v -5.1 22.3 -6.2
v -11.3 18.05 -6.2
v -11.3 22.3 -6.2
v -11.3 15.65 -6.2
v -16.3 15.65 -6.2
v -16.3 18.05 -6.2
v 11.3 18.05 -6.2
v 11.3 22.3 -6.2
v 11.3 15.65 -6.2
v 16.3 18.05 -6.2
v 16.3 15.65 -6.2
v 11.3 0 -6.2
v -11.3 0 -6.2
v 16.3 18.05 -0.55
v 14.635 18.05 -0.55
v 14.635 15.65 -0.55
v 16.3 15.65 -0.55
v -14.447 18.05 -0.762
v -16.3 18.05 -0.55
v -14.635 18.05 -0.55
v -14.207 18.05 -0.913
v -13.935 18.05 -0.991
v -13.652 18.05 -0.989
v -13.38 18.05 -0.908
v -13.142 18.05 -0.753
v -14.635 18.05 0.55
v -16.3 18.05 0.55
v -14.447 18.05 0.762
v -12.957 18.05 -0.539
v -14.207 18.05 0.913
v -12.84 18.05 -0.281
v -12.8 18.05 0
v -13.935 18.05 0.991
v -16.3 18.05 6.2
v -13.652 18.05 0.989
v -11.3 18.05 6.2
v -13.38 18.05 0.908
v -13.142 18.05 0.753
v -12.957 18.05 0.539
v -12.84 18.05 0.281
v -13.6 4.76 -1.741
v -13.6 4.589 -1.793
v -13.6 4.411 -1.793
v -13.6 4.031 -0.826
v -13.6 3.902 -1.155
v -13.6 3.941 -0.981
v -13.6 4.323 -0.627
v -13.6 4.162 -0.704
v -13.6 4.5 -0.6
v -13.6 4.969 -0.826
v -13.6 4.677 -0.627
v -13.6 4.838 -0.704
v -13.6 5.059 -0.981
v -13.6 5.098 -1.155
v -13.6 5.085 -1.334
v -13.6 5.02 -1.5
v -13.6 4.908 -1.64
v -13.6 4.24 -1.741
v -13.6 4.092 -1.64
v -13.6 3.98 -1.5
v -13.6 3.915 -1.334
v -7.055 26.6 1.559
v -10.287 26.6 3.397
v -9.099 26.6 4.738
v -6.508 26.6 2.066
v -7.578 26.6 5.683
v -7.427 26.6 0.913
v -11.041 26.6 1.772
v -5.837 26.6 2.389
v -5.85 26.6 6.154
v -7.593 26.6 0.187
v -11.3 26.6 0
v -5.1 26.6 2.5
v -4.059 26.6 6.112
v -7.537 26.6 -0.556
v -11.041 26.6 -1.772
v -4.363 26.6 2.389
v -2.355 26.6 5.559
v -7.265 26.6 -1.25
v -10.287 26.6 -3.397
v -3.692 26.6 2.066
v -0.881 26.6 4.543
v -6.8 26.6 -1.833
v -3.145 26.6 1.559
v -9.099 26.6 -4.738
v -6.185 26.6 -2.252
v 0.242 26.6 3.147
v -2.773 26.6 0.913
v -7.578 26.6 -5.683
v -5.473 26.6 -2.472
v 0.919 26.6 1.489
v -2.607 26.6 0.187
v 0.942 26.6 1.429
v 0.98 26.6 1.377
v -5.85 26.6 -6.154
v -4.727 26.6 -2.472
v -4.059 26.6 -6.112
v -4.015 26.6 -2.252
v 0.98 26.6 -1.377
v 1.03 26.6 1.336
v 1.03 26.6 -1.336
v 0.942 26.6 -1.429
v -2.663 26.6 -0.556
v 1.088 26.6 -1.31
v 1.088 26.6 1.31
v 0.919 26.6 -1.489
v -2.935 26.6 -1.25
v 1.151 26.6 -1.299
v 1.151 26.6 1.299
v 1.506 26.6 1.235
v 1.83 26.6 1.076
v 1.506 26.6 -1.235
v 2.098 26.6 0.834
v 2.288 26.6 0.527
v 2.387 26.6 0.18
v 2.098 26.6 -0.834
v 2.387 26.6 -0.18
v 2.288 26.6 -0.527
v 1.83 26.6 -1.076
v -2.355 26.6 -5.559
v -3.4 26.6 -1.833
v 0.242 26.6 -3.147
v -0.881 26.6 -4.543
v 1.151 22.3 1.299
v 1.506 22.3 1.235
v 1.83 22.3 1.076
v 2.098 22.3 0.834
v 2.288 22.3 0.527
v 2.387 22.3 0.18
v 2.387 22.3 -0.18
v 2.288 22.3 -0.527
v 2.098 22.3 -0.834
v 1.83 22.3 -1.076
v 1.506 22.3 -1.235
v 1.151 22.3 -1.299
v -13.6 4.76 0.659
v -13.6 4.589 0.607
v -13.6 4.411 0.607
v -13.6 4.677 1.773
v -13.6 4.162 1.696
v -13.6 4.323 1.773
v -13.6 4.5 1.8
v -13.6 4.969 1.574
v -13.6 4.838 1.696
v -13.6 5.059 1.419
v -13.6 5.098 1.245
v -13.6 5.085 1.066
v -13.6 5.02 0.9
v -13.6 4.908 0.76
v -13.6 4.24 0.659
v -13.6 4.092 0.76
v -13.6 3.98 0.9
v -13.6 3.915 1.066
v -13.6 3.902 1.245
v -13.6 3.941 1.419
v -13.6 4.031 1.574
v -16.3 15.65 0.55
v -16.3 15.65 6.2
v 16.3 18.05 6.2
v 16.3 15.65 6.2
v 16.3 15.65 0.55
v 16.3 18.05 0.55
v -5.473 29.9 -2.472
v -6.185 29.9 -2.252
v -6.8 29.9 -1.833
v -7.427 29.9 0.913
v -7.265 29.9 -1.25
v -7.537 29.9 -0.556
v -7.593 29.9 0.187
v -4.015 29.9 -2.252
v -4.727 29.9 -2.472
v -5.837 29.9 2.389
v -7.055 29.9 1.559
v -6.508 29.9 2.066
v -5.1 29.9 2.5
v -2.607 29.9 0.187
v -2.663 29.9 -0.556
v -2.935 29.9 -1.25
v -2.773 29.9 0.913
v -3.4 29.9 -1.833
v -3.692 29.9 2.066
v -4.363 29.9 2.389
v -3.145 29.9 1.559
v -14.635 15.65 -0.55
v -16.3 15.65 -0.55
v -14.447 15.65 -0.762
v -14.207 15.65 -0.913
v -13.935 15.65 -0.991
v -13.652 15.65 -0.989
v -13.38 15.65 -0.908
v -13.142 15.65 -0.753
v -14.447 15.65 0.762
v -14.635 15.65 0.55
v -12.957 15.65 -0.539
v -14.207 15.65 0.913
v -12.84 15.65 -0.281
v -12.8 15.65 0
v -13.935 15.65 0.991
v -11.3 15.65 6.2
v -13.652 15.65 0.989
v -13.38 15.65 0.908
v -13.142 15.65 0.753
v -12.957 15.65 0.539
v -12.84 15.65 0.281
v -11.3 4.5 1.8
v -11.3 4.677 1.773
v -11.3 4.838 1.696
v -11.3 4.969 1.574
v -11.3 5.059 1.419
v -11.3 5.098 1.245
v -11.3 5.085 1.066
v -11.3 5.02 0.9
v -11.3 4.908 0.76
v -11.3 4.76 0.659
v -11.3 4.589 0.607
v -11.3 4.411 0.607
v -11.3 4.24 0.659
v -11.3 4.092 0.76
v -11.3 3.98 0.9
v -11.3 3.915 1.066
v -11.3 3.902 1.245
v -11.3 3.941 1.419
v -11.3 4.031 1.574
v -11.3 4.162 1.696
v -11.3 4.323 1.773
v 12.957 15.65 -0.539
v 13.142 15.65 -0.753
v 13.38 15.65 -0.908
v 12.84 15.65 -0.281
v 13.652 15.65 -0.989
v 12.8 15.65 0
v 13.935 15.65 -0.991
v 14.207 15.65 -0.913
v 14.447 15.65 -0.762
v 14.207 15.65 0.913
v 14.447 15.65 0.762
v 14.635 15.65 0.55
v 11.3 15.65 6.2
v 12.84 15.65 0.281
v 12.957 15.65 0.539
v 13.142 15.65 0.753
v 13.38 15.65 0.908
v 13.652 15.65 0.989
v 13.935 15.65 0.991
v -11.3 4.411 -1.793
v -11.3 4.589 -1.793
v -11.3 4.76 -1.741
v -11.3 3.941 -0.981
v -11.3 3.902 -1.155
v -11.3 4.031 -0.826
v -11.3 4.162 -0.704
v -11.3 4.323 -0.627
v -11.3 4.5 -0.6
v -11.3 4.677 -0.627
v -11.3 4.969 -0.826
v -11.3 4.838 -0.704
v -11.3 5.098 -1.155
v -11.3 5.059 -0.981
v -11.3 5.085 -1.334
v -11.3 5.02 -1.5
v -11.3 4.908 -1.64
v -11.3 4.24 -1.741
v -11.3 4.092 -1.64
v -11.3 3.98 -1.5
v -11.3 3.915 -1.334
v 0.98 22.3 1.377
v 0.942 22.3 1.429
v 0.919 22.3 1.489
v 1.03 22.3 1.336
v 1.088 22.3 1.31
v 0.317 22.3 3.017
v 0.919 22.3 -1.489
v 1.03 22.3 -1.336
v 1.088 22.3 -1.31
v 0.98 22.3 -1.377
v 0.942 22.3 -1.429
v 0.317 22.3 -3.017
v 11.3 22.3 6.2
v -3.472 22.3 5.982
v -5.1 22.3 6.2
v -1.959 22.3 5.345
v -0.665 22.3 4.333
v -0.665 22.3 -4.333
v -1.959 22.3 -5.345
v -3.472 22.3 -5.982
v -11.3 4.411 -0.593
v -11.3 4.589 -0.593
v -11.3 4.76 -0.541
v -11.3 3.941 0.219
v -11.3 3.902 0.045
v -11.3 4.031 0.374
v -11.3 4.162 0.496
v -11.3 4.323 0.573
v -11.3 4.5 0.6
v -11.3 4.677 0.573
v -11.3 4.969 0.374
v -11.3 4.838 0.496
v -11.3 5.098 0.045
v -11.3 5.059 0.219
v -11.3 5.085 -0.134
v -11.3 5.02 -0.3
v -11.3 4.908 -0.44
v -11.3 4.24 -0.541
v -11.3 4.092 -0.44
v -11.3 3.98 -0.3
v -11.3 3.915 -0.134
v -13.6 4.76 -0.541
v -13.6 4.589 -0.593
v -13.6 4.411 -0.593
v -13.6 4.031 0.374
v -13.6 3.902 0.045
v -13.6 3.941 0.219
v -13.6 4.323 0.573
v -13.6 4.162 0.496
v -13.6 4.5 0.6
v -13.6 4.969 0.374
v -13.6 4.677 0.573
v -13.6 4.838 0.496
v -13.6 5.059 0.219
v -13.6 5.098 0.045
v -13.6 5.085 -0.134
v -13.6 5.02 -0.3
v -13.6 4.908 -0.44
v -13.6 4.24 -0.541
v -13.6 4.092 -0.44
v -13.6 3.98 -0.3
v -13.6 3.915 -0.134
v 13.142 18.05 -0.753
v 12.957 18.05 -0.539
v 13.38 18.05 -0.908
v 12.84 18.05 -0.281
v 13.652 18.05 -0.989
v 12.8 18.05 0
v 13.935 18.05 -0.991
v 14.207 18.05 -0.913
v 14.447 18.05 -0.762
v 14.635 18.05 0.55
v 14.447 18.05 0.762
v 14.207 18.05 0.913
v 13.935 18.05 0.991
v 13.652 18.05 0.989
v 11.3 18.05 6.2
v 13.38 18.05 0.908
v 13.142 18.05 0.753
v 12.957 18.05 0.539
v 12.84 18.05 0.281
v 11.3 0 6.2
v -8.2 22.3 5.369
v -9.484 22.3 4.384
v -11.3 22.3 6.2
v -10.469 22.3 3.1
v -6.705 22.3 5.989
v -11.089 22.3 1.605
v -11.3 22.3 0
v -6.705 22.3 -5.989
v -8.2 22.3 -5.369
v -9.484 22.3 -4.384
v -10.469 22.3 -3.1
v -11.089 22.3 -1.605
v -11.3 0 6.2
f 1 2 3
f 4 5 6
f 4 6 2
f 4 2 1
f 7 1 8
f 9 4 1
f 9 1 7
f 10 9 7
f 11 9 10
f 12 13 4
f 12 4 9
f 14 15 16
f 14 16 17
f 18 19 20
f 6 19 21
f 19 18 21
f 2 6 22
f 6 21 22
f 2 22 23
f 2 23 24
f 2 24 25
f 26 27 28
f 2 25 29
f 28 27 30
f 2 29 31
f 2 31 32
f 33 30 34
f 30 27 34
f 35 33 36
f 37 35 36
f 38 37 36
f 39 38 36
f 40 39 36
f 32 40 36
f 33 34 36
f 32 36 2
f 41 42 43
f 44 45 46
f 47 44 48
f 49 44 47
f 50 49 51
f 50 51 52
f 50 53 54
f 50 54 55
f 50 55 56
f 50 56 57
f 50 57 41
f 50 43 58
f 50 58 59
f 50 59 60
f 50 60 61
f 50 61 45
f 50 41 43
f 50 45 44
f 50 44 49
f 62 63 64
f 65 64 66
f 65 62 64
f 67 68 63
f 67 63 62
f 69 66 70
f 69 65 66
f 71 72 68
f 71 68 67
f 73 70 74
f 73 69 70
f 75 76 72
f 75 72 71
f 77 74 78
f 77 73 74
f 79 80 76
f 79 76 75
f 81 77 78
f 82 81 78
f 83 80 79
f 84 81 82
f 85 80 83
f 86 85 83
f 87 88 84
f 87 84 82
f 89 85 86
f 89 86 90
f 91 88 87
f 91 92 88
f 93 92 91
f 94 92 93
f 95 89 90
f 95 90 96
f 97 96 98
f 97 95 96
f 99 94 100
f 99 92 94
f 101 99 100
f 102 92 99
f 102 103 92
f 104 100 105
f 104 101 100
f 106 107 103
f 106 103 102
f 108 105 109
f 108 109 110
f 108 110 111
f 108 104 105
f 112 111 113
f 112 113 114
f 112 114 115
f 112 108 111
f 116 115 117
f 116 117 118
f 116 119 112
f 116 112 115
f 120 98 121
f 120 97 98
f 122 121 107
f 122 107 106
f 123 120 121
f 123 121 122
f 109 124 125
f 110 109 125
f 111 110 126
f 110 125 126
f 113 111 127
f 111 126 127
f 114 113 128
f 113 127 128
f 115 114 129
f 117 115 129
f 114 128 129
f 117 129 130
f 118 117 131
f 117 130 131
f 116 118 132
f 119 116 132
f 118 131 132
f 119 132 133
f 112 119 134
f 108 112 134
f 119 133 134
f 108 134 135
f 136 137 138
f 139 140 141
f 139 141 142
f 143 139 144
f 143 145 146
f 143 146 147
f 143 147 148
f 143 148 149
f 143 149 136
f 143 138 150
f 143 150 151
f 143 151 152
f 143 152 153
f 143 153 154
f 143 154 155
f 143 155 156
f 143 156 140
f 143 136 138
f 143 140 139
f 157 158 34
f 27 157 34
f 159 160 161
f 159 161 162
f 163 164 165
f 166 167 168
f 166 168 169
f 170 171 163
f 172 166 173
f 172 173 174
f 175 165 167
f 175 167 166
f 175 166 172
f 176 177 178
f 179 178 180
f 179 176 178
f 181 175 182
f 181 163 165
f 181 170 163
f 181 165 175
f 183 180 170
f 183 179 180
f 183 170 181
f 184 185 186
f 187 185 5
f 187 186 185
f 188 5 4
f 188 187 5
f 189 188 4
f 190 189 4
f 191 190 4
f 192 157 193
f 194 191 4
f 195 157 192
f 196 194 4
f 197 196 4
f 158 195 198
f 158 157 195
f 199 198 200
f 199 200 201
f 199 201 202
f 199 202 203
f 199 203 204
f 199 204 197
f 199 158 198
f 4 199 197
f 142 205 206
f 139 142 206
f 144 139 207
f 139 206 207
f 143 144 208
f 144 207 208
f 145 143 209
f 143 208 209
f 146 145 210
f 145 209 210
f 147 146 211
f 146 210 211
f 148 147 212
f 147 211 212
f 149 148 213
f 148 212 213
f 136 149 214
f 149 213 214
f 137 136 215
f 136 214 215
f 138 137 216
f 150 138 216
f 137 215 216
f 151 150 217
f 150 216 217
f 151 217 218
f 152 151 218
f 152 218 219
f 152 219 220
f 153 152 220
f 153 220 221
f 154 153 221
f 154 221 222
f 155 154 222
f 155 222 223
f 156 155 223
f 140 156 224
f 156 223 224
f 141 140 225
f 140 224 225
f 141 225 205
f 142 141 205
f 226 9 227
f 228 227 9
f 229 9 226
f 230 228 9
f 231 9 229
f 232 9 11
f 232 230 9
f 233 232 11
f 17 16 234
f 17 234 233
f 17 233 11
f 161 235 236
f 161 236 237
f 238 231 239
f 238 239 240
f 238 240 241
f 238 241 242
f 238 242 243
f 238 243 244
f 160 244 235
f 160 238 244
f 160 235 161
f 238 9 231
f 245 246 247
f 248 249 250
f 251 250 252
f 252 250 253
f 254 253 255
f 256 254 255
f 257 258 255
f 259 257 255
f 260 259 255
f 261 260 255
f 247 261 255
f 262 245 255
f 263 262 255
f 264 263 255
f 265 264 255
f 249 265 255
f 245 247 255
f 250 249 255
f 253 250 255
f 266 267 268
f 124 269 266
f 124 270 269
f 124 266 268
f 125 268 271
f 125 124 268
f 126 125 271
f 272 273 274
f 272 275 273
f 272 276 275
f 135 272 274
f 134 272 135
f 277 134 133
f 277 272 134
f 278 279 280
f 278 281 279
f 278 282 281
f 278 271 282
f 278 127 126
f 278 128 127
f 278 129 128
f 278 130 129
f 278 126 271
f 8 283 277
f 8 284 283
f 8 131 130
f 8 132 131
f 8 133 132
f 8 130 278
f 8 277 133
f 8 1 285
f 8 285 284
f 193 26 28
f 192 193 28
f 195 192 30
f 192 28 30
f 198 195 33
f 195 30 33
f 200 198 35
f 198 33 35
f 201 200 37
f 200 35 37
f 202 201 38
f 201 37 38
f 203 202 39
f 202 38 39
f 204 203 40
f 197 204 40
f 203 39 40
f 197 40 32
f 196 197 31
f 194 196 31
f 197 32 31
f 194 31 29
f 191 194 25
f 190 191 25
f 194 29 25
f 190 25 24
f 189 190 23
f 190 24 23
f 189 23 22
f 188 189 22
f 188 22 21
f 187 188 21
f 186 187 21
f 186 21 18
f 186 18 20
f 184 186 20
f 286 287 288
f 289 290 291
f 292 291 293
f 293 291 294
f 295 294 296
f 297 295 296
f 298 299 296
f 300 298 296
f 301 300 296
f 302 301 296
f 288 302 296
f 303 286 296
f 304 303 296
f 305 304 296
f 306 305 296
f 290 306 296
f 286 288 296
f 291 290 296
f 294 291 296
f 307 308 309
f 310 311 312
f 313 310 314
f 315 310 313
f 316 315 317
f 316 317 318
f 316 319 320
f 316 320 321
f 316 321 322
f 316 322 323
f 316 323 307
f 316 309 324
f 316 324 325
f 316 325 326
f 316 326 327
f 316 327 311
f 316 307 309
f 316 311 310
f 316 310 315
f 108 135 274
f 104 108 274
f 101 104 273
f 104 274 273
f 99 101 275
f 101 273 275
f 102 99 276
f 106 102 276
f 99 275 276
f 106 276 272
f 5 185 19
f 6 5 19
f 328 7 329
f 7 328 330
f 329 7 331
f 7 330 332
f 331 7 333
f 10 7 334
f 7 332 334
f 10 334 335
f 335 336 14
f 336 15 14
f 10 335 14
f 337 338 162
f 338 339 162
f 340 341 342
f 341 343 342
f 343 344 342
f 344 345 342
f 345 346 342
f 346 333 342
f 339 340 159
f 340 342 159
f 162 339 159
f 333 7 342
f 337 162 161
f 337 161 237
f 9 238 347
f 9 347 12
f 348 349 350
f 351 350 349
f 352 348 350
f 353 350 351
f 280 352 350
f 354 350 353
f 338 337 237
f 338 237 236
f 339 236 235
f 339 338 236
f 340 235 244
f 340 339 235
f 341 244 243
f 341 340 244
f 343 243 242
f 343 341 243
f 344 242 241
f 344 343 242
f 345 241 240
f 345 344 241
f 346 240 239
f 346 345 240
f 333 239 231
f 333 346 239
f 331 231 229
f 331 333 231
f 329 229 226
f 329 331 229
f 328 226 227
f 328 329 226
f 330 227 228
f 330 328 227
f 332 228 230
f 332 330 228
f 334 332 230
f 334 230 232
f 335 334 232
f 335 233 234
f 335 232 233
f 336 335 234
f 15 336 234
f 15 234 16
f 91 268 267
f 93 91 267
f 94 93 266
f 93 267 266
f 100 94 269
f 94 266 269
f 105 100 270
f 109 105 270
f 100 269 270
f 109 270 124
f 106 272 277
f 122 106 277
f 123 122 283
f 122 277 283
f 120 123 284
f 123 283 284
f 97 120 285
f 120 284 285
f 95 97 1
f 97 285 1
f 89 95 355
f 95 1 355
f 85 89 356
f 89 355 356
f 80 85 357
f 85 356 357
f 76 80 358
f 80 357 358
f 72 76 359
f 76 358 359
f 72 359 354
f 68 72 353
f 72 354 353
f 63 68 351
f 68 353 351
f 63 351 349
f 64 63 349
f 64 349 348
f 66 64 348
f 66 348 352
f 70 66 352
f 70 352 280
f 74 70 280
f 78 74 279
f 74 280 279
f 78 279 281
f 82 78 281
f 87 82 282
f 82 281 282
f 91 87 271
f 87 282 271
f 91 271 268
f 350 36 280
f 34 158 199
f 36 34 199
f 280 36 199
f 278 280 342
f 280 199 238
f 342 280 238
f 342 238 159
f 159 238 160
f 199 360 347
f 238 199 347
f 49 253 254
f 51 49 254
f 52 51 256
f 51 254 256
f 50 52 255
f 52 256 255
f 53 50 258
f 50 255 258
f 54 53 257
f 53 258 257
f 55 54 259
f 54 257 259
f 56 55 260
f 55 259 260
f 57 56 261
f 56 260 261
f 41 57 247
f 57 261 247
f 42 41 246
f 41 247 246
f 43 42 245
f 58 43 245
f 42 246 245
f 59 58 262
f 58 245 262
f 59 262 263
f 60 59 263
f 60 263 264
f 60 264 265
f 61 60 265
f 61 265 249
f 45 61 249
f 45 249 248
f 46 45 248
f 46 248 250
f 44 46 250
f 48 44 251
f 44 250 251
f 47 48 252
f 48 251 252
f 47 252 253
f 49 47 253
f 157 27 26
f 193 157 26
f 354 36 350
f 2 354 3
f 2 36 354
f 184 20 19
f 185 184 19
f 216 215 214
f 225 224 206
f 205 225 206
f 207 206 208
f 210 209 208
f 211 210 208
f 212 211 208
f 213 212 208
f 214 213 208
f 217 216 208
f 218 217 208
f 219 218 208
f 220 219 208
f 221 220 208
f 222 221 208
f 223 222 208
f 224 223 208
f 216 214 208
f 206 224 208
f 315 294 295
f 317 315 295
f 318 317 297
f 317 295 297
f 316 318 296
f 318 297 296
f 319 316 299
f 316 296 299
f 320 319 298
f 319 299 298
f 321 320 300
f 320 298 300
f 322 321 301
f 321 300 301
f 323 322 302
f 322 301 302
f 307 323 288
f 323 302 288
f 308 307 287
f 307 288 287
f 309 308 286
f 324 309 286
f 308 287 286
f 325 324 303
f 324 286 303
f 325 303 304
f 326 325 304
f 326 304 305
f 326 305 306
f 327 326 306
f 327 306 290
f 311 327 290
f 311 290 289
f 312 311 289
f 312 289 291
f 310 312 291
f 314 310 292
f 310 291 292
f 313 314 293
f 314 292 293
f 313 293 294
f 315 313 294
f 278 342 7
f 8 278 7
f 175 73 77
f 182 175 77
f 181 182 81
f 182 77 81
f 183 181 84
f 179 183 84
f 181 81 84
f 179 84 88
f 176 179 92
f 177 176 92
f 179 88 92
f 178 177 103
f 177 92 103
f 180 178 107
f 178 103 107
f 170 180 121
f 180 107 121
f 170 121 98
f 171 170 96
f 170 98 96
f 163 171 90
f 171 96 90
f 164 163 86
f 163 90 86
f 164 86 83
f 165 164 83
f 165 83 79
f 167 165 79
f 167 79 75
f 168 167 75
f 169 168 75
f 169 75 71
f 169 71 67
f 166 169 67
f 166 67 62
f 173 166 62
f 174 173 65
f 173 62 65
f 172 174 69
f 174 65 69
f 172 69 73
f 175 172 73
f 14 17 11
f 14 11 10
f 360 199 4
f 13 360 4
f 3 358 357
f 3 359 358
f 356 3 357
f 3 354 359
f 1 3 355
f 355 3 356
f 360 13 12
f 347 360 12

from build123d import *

# Parameters (mm, degrees)
SKETCH1_W             = 22.6
SKETCH1_H             = 12.4
BOSS_EXTRUDE1_DEPTH   = 22.3
SKETCH2_W             = 5
SKETCH2_H             = 2.4
BOSS_EXTRUDE2_DEPTH   = 12.4
CUT_EXTRUDE1_DEPTH    = 26.098456128
BOSS_EXTRUDE3_DEPTH   = 4.3
SKETCH5_R             = 2.5
BOSS_EXTRUDE4_DEPTH   = 3.3
SKETCH6_R             = 0.6
BOSS_EXTRUDE7_DEPTH   = 2.3
BOSS_EXTRUDE7_2_DEPTH = 2.3
BOSS_EXTRUDE7_3_DEPTH = 2.3


with BuildPart() as part:
    # Sketch1 → Boss-Extrude1 (new body)
    with BuildSketch(Plane(origin=(0, 0, 0), x_dir=(1, 0, 0), z_dir=(0, 1, 0))):
        Rectangle(SKETCH1_W, SKETCH1_H)
    extrude(amount=BOSS_EXTRUDE1_DEPTH)

    # Sketch2 → Boss-Extrude2 (add)
    with BuildSketch(Plane.XY.offset(6.2)):
        with Locations((13.8, 16.85)):
            Rectangle(SKETCH2_W, SKETCH2_H)
        with Locations((-13.8, 16.85)):
            Rectangle(SKETCH2_W, SKETCH2_H)
    extrude(amount=-BOSS_EXTRUDE2_DEPTH)

    # Sketch3 → Cut-Extrude1 (cut, through all)
    with BuildSketch(Plane(origin=(0, 18.05, 0), x_dir=(1, 0, 0), z_dir=(0, 1, 0))):
        with BuildLine():
            Line((14.635164654, 0.55), (16.3, 0.55))
            Line((16.3, 0.55), (16.3, -0.55))
            Line((16.3, -0.55), (14.635164654, -0.55))
            ThreePointArc((14.635164654, -0.55), (12.8, 0), (14.635164654, 0.55))
        make_face()
        with BuildLine():
            Line((-16.3, -0.55), (-14.635164654, -0.55))
            ThreePointArc((-14.635164654, -0.55), (-12.8, 0), (-14.635164654, 0.55))
            Line((-14.635164654, 0.55), (-16.3, 0.55))
            Line((-16.3, 0.55), (-16.3, -0.55))
        make_face()
    extrude(amount=-CUT_EXTRUDE1_DEPTH, mode=Mode.SUBTRACT)

    # Sketch4 → Boss-Extrude3 (add)
    with BuildSketch(Plane(origin=(0, 22.3, 0), x_dir=(1, 0, 0), z_dir=(0, 1, 0))):
        with BuildLine():
            ThreePointArc((0.918604651, 1.488757218), (-11.3, 0), (0.918604651, -1.488757218))
            ThreePointArc((0.918604651, -1.488757218), (1.003329596, -1.355013632), (1.151404787, -1.298983275))
            ThreePointArc((1.151404787, -1.298983275), (2.4, 0), (1.151404787, 1.298983275))
            ThreePointArc((1.151404787, 1.298983275), (1.003329596, 1.355013632), (0.918604651, 1.488757218))
        make_face()
    extrude(amount=BOSS_EXTRUDE3_DEPTH)

    # Sketch5 → Boss-Extrude4 (add)
    with BuildSketch(Plane(origin=(0, 26.6, 0), x_dir=(1, 0, 0), z_dir=(0, 1, 0))):
        with Locations(Location((-5.1, 0, 0), (0, 0, 270))):
            Circle(SKETCH5_R)
    extrude(amount=BOSS_EXTRUDE4_DEPTH)


with BuildPart() as body_2:
    # Sketch6 → Boss-Extrude7 (new body)
    with BuildSketch(Plane.ZY.offset(11.3)):
        with Locations((0, 4.5)):
            Circle(SKETCH6_R)
    extrude(amount=BOSS_EXTRUDE7_DEPTH)


with BuildPart() as body_3:
    # Sketch6 → Boss-Extrude7 2 (new body)
    with BuildSketch(Plane.ZY.offset(11.3)):
        with Locations((1.2, 4.5)):
            Circle(SKETCH6_R)
    extrude(amount=BOSS_EXTRUDE7_2_DEPTH)


with BuildPart() as body_4:
    # Sketch6 → Boss-Extrude7 3 (new body)
    with BuildSketch(Plane.ZY.offset(11.3)):
        with Locations((-1.2, 4.5)):
            Circle(SKETCH6_R)
    extrude(amount=BOSS_EXTRUDE7_3_DEPTH)


solid = Compound([part.part, body_2.part, body_3.part, body_4.part])
